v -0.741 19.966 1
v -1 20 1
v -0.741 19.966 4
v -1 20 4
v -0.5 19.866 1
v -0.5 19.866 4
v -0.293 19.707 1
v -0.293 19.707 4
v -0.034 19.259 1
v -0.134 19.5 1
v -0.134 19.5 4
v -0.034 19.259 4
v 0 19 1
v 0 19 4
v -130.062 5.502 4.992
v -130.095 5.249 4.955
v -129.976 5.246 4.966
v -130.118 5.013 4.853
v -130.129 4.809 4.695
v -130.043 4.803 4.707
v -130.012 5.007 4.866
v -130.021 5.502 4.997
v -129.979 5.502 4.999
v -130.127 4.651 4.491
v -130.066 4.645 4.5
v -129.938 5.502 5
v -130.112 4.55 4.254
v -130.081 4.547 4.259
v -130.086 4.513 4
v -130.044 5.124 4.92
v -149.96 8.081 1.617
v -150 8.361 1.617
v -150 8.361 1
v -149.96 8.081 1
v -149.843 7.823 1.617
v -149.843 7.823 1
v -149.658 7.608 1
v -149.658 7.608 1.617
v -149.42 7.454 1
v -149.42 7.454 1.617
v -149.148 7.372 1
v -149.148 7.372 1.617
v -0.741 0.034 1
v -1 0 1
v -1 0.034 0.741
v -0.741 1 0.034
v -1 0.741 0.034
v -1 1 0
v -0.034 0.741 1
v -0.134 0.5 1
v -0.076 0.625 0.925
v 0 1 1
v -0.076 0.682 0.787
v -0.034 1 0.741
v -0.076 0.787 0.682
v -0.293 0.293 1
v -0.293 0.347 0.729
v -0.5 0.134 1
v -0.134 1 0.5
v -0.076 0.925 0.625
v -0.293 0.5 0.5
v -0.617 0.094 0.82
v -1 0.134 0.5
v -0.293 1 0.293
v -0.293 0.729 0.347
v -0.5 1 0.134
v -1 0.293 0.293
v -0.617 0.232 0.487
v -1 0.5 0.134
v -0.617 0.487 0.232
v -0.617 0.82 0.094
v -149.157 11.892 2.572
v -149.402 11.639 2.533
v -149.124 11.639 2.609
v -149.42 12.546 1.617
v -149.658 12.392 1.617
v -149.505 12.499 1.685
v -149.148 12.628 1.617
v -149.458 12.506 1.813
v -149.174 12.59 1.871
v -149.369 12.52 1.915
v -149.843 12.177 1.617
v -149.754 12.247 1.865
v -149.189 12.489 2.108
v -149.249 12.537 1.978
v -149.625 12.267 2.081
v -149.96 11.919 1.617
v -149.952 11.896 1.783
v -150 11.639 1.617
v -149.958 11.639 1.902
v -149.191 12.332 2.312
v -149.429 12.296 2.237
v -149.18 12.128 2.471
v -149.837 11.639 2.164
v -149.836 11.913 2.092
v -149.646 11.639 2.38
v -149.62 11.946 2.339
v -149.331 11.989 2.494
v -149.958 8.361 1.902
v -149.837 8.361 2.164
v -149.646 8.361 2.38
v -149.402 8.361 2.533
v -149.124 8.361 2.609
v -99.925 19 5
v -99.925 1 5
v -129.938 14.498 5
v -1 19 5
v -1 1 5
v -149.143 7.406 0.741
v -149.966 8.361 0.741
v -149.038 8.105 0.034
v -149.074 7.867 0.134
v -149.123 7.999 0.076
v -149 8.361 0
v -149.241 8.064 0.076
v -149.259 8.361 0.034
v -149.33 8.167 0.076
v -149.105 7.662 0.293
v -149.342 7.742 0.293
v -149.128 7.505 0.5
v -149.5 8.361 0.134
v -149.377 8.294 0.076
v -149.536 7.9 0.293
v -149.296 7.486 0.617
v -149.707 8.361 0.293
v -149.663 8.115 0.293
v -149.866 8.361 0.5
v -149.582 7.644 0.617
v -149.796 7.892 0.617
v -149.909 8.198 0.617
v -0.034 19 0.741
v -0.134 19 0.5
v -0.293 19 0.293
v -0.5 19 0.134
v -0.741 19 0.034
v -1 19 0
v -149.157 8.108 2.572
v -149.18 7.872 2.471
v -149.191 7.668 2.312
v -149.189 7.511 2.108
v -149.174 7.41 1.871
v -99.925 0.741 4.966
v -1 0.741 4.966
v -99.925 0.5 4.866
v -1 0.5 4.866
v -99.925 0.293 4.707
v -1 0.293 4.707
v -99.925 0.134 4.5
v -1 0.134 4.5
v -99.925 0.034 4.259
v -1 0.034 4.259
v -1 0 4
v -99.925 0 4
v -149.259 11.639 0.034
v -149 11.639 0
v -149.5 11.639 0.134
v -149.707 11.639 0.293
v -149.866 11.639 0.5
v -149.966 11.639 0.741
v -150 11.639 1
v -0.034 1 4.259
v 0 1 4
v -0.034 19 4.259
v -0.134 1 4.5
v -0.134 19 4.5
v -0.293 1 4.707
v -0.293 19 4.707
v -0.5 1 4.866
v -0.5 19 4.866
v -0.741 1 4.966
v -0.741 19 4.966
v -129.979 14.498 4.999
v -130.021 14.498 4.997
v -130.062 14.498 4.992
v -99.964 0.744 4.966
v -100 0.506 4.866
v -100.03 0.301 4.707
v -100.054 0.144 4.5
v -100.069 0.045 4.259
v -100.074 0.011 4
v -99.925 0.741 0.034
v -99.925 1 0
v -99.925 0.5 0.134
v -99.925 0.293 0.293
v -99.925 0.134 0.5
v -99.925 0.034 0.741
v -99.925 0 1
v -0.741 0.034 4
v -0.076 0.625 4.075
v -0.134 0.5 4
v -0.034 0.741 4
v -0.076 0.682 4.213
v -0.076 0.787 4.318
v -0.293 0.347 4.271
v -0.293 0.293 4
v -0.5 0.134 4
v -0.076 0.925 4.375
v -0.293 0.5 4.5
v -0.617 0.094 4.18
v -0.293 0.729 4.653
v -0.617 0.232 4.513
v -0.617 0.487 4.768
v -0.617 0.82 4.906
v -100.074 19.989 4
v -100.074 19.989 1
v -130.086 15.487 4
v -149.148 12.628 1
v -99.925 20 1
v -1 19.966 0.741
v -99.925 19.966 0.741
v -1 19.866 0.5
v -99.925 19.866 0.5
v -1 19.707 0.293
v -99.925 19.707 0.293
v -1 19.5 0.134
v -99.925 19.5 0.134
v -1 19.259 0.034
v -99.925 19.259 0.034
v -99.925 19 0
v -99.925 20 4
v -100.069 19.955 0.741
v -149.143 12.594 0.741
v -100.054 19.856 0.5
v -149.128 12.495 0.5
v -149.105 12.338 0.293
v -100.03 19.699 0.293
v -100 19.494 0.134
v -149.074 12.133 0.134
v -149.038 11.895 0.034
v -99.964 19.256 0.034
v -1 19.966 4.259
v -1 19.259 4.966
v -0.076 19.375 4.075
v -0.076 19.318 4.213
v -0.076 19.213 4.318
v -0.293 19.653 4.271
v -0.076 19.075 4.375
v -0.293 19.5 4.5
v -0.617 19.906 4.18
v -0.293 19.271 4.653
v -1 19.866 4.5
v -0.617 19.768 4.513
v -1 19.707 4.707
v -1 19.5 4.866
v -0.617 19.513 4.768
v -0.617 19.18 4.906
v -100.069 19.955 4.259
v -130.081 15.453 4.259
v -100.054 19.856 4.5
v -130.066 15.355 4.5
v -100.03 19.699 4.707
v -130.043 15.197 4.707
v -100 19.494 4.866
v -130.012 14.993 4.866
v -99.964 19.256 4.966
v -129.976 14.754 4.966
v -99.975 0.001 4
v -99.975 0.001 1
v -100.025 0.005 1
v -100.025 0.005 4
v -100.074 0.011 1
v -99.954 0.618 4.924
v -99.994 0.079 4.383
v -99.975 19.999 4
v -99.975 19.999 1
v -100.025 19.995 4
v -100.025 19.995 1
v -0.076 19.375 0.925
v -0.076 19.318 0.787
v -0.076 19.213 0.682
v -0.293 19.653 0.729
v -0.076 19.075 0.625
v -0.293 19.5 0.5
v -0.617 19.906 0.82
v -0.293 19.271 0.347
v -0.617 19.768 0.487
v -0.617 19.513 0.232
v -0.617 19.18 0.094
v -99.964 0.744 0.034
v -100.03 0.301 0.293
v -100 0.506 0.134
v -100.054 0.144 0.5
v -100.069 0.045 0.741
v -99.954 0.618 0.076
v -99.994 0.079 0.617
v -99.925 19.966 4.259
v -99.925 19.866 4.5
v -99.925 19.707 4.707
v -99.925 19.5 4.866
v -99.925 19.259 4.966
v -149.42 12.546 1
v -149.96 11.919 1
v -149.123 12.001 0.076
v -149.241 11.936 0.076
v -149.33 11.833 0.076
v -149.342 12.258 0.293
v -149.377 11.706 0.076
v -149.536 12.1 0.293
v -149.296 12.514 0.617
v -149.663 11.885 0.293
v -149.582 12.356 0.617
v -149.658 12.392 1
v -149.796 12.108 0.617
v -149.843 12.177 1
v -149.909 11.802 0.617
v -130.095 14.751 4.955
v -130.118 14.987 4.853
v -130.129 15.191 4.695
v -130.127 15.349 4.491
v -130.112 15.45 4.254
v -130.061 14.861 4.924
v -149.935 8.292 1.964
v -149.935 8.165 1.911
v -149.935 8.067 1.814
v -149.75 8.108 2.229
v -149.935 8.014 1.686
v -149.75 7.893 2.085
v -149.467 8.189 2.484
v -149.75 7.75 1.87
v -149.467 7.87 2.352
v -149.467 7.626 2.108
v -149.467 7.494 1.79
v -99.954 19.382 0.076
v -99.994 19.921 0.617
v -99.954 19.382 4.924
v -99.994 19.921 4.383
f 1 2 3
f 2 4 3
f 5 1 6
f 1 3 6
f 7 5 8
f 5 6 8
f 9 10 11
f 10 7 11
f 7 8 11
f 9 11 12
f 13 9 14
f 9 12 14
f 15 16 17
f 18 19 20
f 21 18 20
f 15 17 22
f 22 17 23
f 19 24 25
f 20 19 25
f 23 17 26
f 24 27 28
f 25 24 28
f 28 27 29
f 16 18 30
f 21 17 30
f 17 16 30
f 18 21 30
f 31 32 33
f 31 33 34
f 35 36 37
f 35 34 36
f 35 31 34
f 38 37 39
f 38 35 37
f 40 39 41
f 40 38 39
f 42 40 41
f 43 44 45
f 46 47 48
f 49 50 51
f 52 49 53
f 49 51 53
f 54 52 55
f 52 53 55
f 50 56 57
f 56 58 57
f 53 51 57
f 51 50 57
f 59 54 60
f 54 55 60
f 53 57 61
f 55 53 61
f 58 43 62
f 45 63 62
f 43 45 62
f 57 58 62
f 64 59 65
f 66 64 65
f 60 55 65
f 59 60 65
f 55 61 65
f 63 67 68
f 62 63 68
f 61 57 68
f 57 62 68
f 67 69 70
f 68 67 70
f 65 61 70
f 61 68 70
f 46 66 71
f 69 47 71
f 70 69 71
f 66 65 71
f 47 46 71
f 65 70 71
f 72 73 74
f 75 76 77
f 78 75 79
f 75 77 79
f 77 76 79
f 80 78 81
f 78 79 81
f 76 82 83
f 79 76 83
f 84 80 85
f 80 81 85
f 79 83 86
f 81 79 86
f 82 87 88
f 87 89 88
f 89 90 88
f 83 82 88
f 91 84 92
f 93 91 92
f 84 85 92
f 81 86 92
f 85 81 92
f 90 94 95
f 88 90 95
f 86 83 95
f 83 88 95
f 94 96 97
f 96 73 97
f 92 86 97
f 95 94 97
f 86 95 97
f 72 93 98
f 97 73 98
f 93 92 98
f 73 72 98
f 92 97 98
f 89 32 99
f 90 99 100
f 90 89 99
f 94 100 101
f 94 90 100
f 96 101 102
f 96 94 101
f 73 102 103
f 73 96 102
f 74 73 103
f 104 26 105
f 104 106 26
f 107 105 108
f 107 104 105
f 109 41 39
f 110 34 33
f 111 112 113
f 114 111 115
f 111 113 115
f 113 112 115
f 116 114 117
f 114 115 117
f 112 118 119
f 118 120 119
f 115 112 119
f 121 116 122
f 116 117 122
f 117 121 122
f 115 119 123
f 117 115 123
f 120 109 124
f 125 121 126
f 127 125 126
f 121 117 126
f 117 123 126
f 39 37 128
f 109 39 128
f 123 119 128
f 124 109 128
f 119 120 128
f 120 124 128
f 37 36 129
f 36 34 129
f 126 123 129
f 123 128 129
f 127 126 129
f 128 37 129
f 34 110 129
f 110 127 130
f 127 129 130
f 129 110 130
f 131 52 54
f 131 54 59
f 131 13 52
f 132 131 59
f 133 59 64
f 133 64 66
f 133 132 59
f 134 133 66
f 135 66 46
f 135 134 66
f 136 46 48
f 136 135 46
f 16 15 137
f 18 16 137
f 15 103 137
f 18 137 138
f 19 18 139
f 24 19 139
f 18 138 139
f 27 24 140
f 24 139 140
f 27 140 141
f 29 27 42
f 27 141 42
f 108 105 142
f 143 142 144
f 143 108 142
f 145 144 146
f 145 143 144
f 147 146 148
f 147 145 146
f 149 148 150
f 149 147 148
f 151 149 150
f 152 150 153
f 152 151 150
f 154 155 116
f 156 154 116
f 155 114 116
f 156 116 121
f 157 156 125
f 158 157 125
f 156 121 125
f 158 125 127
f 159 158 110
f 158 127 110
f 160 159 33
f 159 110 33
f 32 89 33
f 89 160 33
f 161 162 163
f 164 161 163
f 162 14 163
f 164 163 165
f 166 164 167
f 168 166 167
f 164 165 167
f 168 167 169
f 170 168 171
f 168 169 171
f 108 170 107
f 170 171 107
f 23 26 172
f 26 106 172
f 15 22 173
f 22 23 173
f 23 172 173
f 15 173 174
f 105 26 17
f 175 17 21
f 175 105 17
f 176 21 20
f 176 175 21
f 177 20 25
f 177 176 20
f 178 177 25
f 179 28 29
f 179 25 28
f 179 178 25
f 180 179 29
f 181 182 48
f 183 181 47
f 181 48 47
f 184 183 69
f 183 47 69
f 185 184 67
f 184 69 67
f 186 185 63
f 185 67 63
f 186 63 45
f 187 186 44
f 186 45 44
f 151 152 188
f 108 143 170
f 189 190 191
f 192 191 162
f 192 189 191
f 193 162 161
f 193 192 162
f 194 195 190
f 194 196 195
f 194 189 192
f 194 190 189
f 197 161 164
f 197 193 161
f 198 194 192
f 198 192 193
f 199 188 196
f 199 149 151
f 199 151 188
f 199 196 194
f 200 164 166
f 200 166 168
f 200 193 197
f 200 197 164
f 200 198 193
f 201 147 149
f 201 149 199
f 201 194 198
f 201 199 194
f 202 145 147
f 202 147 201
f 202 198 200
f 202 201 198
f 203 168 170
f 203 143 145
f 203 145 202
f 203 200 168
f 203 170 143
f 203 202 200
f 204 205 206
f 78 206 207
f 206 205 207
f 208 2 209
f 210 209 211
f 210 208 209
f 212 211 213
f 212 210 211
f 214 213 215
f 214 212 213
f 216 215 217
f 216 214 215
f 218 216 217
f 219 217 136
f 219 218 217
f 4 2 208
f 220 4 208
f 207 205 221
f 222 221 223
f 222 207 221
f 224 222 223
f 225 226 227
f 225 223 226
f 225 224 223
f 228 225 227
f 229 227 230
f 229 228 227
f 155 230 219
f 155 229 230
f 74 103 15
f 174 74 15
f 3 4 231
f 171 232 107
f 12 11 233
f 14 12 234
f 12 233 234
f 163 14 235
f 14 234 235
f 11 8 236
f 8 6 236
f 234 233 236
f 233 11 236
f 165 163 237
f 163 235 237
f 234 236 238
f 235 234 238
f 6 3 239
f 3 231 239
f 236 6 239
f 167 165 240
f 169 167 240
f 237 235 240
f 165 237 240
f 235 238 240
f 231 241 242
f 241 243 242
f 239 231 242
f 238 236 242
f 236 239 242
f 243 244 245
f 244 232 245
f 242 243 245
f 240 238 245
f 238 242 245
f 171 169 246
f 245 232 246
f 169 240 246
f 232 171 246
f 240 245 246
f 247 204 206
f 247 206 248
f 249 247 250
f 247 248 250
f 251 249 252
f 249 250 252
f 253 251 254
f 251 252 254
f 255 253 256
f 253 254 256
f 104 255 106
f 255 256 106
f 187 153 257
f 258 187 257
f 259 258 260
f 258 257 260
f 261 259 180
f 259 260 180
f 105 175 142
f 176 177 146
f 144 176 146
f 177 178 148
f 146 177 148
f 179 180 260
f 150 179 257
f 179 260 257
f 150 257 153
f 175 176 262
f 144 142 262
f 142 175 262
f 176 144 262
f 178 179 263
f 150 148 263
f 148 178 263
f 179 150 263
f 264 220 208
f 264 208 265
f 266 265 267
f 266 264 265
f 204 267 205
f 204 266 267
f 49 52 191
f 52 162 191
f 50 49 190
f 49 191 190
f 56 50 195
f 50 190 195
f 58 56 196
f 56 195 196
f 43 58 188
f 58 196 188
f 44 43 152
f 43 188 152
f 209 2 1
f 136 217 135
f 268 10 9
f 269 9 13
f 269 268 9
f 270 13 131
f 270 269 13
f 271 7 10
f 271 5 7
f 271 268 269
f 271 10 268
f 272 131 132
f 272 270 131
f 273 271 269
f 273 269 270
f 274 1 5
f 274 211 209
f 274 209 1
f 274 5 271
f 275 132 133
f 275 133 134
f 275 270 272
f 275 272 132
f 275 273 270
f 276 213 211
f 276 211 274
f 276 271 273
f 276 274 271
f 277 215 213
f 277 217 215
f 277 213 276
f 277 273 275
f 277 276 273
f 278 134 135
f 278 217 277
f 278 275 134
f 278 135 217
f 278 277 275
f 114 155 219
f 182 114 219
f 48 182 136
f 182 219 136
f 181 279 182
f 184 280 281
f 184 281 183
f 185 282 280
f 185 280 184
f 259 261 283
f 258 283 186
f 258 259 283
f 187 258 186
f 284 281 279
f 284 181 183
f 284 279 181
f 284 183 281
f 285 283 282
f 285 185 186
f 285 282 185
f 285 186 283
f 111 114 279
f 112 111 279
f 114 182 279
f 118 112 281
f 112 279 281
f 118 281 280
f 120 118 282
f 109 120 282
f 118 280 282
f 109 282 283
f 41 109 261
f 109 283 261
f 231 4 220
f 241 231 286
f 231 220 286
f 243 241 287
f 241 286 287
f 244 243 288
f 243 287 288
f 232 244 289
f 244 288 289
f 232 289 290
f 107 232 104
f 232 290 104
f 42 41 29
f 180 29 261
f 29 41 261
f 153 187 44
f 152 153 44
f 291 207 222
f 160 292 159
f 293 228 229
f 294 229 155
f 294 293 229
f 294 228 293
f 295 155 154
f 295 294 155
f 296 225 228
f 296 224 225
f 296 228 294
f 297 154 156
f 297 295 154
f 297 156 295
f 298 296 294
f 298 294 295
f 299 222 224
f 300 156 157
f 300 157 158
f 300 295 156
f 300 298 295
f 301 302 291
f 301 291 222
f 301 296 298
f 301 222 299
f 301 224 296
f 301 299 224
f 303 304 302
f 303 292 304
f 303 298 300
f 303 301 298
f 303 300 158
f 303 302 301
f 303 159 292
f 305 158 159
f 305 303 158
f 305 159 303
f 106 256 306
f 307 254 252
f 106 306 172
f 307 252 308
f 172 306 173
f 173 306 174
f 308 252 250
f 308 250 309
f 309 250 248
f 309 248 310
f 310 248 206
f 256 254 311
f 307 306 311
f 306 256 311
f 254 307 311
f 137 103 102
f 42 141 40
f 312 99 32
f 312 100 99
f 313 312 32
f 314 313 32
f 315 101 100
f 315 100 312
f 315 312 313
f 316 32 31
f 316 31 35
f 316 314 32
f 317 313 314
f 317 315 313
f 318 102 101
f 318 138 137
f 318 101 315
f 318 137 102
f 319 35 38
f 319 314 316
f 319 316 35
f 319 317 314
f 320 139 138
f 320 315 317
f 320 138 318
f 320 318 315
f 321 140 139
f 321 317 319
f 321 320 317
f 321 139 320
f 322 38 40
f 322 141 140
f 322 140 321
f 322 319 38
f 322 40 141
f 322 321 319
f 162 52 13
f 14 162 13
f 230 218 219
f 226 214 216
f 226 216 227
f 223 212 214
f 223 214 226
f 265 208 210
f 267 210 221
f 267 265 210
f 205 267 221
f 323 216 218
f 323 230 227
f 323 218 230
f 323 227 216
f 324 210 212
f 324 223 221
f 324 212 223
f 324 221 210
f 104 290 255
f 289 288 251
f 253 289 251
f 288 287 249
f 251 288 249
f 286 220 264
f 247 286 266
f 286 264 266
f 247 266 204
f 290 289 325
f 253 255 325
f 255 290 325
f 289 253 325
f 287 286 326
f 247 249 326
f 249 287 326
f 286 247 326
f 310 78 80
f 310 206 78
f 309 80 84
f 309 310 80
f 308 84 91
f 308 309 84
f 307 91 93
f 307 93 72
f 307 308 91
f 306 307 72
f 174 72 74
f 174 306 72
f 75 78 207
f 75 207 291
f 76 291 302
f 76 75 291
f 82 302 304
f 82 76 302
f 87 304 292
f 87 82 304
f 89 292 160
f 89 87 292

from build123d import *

# Parameters (mm, degrees)
F1_DEPTH = 5
F3_DEPTH = 20.001
F4_R     = 1


with BuildPart() as f1:
    # F0 (on Top) → F1 (new body)
    with BuildSketch(Plane.XY):
        Polygon((0, 20), (-100, 20), (-150, 12.5), (-150, 7.5), (-100, 0), (0, 0), align=None)
    extrude(amount=F1_DEPTH)

    # F2 (on face) → F3 (cut, through all)
    with BuildSketch(Plane.XZ):
        Polygon((-150, 5), (-150, 2.5), (-130, 5), align=None)
    extrude(amount=-F3_DEPTH, mode=Mode.SUBTRACT)

    # F4
    f4_edges = [f1.edges().sort_by_distance(p)[0] for p in [
        (-115, 2.25, 5),
        (-140, 6, 3.75),
        (-150, 10, 2.5),
        (-150, 10, 0),
        (-150, 7.5, 1.25),
        (-150, 12.5, 1.25),
        (-140, 14, 3.75),
        (-115, 17.75, 5),
        (-125, 16.25, 0),
        (-130, 10, 5),
        (-125, 3.75, 0),
        (-50, 0, 0),
        (-50, 0, 5),
        (-100, 0, 2.5),
        (-100, 20, 2.5),
        (-50, 20, 5),
        (-50, 20, 0),
        (0, 20, 2.5),
        (0, 0, 2.5),
        (0, 10, 5),
        (0, 10, 0),
    ]]
    fillet(f4_edges, radius=F4_R)


solid = f1.part
